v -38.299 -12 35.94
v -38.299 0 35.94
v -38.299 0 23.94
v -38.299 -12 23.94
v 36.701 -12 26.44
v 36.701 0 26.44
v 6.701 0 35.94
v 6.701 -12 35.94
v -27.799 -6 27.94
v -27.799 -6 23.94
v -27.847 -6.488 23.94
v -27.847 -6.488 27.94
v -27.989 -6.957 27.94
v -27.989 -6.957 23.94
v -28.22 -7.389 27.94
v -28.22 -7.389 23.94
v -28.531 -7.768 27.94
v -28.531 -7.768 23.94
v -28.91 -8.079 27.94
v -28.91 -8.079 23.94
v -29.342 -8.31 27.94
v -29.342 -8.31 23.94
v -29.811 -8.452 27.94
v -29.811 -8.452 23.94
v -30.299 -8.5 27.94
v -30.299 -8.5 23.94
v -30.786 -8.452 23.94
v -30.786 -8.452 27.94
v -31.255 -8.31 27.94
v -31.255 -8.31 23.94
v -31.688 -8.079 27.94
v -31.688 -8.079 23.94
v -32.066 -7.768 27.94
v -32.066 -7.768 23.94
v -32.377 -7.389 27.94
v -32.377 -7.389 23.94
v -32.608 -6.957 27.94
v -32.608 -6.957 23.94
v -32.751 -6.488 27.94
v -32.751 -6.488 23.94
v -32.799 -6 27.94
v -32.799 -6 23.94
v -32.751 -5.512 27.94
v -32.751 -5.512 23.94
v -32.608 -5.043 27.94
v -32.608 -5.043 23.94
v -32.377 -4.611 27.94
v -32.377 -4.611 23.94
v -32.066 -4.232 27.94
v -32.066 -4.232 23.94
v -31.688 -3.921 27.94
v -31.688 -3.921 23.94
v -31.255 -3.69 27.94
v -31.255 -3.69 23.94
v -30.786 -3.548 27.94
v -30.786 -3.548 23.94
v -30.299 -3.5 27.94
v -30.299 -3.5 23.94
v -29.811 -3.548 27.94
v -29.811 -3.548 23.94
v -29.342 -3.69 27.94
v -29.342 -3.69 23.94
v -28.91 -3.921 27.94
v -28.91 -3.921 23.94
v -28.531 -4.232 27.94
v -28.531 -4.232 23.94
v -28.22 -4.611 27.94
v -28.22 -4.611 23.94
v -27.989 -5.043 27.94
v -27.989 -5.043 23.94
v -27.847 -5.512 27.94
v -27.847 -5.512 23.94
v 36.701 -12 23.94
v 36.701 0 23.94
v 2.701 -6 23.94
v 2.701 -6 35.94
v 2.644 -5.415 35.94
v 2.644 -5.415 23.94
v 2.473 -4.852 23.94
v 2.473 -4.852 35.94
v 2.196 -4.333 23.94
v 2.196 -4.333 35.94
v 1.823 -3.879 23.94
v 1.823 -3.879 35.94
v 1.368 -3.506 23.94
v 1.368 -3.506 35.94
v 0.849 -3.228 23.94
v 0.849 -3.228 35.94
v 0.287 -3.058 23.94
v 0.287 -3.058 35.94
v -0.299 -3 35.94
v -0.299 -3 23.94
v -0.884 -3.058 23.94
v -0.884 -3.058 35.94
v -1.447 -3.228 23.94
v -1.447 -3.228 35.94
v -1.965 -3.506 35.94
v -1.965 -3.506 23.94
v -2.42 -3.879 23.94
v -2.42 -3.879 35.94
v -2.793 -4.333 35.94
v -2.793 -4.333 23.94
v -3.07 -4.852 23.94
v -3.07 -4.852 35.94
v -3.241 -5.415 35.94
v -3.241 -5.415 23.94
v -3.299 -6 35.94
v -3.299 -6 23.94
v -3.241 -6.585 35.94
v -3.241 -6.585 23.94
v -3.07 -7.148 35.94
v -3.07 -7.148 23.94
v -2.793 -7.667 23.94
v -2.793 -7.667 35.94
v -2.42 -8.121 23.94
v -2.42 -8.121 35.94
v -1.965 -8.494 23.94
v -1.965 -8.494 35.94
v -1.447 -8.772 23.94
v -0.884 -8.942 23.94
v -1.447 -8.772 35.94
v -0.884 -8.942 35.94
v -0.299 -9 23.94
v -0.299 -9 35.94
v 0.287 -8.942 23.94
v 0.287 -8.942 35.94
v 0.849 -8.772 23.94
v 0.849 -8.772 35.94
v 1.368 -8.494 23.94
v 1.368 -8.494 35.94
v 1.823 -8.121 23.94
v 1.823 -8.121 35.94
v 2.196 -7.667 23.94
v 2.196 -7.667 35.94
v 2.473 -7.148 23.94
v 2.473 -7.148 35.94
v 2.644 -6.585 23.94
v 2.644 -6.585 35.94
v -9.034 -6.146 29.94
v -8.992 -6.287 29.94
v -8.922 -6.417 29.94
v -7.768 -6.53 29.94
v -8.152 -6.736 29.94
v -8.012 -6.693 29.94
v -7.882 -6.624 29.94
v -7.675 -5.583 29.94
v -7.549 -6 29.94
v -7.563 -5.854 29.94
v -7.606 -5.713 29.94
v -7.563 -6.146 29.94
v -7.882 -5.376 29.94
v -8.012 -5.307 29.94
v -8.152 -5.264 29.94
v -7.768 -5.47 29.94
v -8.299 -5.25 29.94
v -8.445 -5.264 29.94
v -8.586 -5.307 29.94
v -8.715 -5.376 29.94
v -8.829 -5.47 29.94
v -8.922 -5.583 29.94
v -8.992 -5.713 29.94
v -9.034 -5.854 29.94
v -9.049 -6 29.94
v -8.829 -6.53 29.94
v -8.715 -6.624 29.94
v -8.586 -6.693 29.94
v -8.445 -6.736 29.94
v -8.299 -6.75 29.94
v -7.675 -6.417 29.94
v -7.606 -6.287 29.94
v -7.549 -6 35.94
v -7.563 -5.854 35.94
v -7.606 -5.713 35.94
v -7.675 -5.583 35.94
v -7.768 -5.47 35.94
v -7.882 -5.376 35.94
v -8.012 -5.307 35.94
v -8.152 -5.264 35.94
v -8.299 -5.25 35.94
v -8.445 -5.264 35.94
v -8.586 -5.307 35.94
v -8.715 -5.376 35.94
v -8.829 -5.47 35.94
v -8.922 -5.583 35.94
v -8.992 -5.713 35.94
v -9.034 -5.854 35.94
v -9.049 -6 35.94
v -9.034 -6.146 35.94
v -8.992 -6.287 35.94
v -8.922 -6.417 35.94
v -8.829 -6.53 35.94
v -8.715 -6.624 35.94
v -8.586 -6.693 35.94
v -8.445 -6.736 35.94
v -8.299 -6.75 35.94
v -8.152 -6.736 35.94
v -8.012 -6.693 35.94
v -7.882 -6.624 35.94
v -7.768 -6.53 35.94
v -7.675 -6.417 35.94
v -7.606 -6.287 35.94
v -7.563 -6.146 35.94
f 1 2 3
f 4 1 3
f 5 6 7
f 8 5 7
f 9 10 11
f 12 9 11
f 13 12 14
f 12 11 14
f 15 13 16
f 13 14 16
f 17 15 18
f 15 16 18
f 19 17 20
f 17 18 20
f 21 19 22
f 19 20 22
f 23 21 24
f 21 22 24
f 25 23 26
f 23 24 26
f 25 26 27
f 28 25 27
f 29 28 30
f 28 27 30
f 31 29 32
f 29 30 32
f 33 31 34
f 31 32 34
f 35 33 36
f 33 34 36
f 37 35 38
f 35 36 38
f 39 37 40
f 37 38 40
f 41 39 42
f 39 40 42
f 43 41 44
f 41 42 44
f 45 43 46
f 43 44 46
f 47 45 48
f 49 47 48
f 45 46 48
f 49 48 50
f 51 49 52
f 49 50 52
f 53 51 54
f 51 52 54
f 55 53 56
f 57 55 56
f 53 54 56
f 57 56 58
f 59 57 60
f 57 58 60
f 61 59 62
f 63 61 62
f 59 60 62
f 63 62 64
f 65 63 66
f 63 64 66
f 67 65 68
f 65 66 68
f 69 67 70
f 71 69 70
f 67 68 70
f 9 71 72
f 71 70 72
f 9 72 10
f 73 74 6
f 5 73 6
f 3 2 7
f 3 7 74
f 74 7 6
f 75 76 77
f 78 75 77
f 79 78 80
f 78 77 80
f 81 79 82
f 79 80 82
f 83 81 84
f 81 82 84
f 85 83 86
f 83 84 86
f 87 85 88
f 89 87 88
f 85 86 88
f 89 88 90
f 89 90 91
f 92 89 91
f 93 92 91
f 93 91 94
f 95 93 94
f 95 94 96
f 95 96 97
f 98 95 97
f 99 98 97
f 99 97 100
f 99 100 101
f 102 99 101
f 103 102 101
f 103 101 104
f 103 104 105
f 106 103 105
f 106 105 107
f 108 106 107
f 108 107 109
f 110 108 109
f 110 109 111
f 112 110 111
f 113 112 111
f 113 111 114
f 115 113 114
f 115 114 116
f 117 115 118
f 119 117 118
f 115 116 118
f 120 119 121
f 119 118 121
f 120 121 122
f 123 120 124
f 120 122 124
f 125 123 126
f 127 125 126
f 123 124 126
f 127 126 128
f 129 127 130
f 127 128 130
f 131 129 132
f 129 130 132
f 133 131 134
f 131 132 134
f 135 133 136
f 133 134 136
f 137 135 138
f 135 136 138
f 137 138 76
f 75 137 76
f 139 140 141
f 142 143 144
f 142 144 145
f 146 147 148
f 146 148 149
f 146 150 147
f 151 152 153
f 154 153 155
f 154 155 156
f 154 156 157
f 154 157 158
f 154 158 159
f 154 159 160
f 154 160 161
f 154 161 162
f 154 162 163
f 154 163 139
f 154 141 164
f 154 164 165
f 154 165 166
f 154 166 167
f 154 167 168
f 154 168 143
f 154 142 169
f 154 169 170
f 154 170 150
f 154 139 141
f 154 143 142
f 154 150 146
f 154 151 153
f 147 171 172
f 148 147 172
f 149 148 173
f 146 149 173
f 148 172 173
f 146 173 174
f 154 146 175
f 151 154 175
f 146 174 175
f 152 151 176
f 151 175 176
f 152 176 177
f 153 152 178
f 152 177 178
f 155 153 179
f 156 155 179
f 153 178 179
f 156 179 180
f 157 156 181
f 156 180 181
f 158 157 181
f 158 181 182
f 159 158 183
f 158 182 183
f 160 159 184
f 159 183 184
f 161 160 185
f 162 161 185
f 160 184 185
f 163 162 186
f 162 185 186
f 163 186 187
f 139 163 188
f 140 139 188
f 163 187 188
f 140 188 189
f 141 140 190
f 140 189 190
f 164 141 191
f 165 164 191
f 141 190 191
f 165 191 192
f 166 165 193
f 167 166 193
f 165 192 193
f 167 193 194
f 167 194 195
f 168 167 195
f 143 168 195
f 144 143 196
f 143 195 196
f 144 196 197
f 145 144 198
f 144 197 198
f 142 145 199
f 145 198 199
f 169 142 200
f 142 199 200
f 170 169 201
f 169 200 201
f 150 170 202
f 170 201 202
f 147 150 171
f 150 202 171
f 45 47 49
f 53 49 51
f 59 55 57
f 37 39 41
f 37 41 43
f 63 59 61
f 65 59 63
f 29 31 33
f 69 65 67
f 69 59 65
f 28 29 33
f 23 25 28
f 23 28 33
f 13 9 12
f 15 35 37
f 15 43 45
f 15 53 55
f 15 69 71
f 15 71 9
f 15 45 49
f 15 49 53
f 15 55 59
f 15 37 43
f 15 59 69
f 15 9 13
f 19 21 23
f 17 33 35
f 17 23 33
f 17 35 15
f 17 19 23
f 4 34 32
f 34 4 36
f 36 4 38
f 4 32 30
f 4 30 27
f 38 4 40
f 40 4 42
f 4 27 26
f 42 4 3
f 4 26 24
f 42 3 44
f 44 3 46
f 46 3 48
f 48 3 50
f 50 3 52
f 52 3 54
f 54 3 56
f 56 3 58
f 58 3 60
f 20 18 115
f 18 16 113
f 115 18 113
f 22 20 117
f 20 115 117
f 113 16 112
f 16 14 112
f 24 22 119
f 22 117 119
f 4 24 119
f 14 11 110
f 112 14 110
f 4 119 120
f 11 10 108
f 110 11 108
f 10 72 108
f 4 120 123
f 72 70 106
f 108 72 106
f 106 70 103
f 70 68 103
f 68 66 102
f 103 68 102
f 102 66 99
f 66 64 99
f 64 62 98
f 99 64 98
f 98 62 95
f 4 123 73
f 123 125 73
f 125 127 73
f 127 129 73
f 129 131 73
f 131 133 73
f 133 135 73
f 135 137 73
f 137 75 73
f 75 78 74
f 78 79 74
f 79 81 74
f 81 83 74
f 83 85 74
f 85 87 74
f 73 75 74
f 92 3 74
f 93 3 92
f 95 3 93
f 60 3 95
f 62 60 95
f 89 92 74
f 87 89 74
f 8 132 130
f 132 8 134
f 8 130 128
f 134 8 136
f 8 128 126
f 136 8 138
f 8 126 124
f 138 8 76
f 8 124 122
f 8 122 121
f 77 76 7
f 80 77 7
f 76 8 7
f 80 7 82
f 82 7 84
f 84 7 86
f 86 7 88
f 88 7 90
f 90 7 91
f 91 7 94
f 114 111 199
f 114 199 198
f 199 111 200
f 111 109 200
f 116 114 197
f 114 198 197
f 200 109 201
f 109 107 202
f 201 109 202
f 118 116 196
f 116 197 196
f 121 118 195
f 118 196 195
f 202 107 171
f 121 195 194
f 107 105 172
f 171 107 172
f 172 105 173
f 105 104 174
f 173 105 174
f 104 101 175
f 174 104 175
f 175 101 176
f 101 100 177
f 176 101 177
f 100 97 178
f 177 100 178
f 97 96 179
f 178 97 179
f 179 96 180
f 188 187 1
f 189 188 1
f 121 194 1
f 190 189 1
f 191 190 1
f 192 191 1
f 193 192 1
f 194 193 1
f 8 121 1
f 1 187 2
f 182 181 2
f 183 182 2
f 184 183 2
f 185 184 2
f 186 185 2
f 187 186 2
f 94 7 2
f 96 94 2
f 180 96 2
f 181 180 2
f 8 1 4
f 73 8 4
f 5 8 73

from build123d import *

# Parameters (mm, degrees)
F1_DEPTH = 12
F2_R     = 3
F3_DEPTH = 25
F4_R     = 0.75
F5_DEPTH = 6
F6_R     = 2.5
F7_DEPTH = 4


with BuildPart() as f1:
    # F0 (on Front) → F1 (new body)
    with BuildSketch(Plane.XZ):
        Polygon((6.70136, 35.939517), (-38.29864, 35.939517), (-38.29864, 23.939517), (36.70136, 23.939517), (36.70136, 26.439517), align=None)
    extrude(amount=F1_DEPTH)

    # F2 (on face) → F3 (cut)
    with BuildSketch(Plane.XY.offset(35.939517)):
        with Locations((-0.29864, -6)):
            Circle(F2_R)
    extrude(amount=-F3_DEPTH, mode=Mode.SUBTRACT)

    # F4 (on face) → F5 (cut)
    with BuildSketch(Plane.XY.offset(35.939517)):
        with Locations((-8.29864, -6)):
            Circle(F4_R)
    extrude(amount=-F5_DEPTH, mode=Mode.SUBTRACT)

    # F6 (on face) → F7 (cut)
    with BuildSketch(Plane(origin=(0, 0, 23.939517), x_dir=(1, 0, 0), z_dir=(0, 0, -1))):
        with Locations((-30.29864, 6)):
            Circle(F6_R)
    extrude(amount=-F7_DEPTH, mode=Mode.SUBTRACT)


solid = f1.part
